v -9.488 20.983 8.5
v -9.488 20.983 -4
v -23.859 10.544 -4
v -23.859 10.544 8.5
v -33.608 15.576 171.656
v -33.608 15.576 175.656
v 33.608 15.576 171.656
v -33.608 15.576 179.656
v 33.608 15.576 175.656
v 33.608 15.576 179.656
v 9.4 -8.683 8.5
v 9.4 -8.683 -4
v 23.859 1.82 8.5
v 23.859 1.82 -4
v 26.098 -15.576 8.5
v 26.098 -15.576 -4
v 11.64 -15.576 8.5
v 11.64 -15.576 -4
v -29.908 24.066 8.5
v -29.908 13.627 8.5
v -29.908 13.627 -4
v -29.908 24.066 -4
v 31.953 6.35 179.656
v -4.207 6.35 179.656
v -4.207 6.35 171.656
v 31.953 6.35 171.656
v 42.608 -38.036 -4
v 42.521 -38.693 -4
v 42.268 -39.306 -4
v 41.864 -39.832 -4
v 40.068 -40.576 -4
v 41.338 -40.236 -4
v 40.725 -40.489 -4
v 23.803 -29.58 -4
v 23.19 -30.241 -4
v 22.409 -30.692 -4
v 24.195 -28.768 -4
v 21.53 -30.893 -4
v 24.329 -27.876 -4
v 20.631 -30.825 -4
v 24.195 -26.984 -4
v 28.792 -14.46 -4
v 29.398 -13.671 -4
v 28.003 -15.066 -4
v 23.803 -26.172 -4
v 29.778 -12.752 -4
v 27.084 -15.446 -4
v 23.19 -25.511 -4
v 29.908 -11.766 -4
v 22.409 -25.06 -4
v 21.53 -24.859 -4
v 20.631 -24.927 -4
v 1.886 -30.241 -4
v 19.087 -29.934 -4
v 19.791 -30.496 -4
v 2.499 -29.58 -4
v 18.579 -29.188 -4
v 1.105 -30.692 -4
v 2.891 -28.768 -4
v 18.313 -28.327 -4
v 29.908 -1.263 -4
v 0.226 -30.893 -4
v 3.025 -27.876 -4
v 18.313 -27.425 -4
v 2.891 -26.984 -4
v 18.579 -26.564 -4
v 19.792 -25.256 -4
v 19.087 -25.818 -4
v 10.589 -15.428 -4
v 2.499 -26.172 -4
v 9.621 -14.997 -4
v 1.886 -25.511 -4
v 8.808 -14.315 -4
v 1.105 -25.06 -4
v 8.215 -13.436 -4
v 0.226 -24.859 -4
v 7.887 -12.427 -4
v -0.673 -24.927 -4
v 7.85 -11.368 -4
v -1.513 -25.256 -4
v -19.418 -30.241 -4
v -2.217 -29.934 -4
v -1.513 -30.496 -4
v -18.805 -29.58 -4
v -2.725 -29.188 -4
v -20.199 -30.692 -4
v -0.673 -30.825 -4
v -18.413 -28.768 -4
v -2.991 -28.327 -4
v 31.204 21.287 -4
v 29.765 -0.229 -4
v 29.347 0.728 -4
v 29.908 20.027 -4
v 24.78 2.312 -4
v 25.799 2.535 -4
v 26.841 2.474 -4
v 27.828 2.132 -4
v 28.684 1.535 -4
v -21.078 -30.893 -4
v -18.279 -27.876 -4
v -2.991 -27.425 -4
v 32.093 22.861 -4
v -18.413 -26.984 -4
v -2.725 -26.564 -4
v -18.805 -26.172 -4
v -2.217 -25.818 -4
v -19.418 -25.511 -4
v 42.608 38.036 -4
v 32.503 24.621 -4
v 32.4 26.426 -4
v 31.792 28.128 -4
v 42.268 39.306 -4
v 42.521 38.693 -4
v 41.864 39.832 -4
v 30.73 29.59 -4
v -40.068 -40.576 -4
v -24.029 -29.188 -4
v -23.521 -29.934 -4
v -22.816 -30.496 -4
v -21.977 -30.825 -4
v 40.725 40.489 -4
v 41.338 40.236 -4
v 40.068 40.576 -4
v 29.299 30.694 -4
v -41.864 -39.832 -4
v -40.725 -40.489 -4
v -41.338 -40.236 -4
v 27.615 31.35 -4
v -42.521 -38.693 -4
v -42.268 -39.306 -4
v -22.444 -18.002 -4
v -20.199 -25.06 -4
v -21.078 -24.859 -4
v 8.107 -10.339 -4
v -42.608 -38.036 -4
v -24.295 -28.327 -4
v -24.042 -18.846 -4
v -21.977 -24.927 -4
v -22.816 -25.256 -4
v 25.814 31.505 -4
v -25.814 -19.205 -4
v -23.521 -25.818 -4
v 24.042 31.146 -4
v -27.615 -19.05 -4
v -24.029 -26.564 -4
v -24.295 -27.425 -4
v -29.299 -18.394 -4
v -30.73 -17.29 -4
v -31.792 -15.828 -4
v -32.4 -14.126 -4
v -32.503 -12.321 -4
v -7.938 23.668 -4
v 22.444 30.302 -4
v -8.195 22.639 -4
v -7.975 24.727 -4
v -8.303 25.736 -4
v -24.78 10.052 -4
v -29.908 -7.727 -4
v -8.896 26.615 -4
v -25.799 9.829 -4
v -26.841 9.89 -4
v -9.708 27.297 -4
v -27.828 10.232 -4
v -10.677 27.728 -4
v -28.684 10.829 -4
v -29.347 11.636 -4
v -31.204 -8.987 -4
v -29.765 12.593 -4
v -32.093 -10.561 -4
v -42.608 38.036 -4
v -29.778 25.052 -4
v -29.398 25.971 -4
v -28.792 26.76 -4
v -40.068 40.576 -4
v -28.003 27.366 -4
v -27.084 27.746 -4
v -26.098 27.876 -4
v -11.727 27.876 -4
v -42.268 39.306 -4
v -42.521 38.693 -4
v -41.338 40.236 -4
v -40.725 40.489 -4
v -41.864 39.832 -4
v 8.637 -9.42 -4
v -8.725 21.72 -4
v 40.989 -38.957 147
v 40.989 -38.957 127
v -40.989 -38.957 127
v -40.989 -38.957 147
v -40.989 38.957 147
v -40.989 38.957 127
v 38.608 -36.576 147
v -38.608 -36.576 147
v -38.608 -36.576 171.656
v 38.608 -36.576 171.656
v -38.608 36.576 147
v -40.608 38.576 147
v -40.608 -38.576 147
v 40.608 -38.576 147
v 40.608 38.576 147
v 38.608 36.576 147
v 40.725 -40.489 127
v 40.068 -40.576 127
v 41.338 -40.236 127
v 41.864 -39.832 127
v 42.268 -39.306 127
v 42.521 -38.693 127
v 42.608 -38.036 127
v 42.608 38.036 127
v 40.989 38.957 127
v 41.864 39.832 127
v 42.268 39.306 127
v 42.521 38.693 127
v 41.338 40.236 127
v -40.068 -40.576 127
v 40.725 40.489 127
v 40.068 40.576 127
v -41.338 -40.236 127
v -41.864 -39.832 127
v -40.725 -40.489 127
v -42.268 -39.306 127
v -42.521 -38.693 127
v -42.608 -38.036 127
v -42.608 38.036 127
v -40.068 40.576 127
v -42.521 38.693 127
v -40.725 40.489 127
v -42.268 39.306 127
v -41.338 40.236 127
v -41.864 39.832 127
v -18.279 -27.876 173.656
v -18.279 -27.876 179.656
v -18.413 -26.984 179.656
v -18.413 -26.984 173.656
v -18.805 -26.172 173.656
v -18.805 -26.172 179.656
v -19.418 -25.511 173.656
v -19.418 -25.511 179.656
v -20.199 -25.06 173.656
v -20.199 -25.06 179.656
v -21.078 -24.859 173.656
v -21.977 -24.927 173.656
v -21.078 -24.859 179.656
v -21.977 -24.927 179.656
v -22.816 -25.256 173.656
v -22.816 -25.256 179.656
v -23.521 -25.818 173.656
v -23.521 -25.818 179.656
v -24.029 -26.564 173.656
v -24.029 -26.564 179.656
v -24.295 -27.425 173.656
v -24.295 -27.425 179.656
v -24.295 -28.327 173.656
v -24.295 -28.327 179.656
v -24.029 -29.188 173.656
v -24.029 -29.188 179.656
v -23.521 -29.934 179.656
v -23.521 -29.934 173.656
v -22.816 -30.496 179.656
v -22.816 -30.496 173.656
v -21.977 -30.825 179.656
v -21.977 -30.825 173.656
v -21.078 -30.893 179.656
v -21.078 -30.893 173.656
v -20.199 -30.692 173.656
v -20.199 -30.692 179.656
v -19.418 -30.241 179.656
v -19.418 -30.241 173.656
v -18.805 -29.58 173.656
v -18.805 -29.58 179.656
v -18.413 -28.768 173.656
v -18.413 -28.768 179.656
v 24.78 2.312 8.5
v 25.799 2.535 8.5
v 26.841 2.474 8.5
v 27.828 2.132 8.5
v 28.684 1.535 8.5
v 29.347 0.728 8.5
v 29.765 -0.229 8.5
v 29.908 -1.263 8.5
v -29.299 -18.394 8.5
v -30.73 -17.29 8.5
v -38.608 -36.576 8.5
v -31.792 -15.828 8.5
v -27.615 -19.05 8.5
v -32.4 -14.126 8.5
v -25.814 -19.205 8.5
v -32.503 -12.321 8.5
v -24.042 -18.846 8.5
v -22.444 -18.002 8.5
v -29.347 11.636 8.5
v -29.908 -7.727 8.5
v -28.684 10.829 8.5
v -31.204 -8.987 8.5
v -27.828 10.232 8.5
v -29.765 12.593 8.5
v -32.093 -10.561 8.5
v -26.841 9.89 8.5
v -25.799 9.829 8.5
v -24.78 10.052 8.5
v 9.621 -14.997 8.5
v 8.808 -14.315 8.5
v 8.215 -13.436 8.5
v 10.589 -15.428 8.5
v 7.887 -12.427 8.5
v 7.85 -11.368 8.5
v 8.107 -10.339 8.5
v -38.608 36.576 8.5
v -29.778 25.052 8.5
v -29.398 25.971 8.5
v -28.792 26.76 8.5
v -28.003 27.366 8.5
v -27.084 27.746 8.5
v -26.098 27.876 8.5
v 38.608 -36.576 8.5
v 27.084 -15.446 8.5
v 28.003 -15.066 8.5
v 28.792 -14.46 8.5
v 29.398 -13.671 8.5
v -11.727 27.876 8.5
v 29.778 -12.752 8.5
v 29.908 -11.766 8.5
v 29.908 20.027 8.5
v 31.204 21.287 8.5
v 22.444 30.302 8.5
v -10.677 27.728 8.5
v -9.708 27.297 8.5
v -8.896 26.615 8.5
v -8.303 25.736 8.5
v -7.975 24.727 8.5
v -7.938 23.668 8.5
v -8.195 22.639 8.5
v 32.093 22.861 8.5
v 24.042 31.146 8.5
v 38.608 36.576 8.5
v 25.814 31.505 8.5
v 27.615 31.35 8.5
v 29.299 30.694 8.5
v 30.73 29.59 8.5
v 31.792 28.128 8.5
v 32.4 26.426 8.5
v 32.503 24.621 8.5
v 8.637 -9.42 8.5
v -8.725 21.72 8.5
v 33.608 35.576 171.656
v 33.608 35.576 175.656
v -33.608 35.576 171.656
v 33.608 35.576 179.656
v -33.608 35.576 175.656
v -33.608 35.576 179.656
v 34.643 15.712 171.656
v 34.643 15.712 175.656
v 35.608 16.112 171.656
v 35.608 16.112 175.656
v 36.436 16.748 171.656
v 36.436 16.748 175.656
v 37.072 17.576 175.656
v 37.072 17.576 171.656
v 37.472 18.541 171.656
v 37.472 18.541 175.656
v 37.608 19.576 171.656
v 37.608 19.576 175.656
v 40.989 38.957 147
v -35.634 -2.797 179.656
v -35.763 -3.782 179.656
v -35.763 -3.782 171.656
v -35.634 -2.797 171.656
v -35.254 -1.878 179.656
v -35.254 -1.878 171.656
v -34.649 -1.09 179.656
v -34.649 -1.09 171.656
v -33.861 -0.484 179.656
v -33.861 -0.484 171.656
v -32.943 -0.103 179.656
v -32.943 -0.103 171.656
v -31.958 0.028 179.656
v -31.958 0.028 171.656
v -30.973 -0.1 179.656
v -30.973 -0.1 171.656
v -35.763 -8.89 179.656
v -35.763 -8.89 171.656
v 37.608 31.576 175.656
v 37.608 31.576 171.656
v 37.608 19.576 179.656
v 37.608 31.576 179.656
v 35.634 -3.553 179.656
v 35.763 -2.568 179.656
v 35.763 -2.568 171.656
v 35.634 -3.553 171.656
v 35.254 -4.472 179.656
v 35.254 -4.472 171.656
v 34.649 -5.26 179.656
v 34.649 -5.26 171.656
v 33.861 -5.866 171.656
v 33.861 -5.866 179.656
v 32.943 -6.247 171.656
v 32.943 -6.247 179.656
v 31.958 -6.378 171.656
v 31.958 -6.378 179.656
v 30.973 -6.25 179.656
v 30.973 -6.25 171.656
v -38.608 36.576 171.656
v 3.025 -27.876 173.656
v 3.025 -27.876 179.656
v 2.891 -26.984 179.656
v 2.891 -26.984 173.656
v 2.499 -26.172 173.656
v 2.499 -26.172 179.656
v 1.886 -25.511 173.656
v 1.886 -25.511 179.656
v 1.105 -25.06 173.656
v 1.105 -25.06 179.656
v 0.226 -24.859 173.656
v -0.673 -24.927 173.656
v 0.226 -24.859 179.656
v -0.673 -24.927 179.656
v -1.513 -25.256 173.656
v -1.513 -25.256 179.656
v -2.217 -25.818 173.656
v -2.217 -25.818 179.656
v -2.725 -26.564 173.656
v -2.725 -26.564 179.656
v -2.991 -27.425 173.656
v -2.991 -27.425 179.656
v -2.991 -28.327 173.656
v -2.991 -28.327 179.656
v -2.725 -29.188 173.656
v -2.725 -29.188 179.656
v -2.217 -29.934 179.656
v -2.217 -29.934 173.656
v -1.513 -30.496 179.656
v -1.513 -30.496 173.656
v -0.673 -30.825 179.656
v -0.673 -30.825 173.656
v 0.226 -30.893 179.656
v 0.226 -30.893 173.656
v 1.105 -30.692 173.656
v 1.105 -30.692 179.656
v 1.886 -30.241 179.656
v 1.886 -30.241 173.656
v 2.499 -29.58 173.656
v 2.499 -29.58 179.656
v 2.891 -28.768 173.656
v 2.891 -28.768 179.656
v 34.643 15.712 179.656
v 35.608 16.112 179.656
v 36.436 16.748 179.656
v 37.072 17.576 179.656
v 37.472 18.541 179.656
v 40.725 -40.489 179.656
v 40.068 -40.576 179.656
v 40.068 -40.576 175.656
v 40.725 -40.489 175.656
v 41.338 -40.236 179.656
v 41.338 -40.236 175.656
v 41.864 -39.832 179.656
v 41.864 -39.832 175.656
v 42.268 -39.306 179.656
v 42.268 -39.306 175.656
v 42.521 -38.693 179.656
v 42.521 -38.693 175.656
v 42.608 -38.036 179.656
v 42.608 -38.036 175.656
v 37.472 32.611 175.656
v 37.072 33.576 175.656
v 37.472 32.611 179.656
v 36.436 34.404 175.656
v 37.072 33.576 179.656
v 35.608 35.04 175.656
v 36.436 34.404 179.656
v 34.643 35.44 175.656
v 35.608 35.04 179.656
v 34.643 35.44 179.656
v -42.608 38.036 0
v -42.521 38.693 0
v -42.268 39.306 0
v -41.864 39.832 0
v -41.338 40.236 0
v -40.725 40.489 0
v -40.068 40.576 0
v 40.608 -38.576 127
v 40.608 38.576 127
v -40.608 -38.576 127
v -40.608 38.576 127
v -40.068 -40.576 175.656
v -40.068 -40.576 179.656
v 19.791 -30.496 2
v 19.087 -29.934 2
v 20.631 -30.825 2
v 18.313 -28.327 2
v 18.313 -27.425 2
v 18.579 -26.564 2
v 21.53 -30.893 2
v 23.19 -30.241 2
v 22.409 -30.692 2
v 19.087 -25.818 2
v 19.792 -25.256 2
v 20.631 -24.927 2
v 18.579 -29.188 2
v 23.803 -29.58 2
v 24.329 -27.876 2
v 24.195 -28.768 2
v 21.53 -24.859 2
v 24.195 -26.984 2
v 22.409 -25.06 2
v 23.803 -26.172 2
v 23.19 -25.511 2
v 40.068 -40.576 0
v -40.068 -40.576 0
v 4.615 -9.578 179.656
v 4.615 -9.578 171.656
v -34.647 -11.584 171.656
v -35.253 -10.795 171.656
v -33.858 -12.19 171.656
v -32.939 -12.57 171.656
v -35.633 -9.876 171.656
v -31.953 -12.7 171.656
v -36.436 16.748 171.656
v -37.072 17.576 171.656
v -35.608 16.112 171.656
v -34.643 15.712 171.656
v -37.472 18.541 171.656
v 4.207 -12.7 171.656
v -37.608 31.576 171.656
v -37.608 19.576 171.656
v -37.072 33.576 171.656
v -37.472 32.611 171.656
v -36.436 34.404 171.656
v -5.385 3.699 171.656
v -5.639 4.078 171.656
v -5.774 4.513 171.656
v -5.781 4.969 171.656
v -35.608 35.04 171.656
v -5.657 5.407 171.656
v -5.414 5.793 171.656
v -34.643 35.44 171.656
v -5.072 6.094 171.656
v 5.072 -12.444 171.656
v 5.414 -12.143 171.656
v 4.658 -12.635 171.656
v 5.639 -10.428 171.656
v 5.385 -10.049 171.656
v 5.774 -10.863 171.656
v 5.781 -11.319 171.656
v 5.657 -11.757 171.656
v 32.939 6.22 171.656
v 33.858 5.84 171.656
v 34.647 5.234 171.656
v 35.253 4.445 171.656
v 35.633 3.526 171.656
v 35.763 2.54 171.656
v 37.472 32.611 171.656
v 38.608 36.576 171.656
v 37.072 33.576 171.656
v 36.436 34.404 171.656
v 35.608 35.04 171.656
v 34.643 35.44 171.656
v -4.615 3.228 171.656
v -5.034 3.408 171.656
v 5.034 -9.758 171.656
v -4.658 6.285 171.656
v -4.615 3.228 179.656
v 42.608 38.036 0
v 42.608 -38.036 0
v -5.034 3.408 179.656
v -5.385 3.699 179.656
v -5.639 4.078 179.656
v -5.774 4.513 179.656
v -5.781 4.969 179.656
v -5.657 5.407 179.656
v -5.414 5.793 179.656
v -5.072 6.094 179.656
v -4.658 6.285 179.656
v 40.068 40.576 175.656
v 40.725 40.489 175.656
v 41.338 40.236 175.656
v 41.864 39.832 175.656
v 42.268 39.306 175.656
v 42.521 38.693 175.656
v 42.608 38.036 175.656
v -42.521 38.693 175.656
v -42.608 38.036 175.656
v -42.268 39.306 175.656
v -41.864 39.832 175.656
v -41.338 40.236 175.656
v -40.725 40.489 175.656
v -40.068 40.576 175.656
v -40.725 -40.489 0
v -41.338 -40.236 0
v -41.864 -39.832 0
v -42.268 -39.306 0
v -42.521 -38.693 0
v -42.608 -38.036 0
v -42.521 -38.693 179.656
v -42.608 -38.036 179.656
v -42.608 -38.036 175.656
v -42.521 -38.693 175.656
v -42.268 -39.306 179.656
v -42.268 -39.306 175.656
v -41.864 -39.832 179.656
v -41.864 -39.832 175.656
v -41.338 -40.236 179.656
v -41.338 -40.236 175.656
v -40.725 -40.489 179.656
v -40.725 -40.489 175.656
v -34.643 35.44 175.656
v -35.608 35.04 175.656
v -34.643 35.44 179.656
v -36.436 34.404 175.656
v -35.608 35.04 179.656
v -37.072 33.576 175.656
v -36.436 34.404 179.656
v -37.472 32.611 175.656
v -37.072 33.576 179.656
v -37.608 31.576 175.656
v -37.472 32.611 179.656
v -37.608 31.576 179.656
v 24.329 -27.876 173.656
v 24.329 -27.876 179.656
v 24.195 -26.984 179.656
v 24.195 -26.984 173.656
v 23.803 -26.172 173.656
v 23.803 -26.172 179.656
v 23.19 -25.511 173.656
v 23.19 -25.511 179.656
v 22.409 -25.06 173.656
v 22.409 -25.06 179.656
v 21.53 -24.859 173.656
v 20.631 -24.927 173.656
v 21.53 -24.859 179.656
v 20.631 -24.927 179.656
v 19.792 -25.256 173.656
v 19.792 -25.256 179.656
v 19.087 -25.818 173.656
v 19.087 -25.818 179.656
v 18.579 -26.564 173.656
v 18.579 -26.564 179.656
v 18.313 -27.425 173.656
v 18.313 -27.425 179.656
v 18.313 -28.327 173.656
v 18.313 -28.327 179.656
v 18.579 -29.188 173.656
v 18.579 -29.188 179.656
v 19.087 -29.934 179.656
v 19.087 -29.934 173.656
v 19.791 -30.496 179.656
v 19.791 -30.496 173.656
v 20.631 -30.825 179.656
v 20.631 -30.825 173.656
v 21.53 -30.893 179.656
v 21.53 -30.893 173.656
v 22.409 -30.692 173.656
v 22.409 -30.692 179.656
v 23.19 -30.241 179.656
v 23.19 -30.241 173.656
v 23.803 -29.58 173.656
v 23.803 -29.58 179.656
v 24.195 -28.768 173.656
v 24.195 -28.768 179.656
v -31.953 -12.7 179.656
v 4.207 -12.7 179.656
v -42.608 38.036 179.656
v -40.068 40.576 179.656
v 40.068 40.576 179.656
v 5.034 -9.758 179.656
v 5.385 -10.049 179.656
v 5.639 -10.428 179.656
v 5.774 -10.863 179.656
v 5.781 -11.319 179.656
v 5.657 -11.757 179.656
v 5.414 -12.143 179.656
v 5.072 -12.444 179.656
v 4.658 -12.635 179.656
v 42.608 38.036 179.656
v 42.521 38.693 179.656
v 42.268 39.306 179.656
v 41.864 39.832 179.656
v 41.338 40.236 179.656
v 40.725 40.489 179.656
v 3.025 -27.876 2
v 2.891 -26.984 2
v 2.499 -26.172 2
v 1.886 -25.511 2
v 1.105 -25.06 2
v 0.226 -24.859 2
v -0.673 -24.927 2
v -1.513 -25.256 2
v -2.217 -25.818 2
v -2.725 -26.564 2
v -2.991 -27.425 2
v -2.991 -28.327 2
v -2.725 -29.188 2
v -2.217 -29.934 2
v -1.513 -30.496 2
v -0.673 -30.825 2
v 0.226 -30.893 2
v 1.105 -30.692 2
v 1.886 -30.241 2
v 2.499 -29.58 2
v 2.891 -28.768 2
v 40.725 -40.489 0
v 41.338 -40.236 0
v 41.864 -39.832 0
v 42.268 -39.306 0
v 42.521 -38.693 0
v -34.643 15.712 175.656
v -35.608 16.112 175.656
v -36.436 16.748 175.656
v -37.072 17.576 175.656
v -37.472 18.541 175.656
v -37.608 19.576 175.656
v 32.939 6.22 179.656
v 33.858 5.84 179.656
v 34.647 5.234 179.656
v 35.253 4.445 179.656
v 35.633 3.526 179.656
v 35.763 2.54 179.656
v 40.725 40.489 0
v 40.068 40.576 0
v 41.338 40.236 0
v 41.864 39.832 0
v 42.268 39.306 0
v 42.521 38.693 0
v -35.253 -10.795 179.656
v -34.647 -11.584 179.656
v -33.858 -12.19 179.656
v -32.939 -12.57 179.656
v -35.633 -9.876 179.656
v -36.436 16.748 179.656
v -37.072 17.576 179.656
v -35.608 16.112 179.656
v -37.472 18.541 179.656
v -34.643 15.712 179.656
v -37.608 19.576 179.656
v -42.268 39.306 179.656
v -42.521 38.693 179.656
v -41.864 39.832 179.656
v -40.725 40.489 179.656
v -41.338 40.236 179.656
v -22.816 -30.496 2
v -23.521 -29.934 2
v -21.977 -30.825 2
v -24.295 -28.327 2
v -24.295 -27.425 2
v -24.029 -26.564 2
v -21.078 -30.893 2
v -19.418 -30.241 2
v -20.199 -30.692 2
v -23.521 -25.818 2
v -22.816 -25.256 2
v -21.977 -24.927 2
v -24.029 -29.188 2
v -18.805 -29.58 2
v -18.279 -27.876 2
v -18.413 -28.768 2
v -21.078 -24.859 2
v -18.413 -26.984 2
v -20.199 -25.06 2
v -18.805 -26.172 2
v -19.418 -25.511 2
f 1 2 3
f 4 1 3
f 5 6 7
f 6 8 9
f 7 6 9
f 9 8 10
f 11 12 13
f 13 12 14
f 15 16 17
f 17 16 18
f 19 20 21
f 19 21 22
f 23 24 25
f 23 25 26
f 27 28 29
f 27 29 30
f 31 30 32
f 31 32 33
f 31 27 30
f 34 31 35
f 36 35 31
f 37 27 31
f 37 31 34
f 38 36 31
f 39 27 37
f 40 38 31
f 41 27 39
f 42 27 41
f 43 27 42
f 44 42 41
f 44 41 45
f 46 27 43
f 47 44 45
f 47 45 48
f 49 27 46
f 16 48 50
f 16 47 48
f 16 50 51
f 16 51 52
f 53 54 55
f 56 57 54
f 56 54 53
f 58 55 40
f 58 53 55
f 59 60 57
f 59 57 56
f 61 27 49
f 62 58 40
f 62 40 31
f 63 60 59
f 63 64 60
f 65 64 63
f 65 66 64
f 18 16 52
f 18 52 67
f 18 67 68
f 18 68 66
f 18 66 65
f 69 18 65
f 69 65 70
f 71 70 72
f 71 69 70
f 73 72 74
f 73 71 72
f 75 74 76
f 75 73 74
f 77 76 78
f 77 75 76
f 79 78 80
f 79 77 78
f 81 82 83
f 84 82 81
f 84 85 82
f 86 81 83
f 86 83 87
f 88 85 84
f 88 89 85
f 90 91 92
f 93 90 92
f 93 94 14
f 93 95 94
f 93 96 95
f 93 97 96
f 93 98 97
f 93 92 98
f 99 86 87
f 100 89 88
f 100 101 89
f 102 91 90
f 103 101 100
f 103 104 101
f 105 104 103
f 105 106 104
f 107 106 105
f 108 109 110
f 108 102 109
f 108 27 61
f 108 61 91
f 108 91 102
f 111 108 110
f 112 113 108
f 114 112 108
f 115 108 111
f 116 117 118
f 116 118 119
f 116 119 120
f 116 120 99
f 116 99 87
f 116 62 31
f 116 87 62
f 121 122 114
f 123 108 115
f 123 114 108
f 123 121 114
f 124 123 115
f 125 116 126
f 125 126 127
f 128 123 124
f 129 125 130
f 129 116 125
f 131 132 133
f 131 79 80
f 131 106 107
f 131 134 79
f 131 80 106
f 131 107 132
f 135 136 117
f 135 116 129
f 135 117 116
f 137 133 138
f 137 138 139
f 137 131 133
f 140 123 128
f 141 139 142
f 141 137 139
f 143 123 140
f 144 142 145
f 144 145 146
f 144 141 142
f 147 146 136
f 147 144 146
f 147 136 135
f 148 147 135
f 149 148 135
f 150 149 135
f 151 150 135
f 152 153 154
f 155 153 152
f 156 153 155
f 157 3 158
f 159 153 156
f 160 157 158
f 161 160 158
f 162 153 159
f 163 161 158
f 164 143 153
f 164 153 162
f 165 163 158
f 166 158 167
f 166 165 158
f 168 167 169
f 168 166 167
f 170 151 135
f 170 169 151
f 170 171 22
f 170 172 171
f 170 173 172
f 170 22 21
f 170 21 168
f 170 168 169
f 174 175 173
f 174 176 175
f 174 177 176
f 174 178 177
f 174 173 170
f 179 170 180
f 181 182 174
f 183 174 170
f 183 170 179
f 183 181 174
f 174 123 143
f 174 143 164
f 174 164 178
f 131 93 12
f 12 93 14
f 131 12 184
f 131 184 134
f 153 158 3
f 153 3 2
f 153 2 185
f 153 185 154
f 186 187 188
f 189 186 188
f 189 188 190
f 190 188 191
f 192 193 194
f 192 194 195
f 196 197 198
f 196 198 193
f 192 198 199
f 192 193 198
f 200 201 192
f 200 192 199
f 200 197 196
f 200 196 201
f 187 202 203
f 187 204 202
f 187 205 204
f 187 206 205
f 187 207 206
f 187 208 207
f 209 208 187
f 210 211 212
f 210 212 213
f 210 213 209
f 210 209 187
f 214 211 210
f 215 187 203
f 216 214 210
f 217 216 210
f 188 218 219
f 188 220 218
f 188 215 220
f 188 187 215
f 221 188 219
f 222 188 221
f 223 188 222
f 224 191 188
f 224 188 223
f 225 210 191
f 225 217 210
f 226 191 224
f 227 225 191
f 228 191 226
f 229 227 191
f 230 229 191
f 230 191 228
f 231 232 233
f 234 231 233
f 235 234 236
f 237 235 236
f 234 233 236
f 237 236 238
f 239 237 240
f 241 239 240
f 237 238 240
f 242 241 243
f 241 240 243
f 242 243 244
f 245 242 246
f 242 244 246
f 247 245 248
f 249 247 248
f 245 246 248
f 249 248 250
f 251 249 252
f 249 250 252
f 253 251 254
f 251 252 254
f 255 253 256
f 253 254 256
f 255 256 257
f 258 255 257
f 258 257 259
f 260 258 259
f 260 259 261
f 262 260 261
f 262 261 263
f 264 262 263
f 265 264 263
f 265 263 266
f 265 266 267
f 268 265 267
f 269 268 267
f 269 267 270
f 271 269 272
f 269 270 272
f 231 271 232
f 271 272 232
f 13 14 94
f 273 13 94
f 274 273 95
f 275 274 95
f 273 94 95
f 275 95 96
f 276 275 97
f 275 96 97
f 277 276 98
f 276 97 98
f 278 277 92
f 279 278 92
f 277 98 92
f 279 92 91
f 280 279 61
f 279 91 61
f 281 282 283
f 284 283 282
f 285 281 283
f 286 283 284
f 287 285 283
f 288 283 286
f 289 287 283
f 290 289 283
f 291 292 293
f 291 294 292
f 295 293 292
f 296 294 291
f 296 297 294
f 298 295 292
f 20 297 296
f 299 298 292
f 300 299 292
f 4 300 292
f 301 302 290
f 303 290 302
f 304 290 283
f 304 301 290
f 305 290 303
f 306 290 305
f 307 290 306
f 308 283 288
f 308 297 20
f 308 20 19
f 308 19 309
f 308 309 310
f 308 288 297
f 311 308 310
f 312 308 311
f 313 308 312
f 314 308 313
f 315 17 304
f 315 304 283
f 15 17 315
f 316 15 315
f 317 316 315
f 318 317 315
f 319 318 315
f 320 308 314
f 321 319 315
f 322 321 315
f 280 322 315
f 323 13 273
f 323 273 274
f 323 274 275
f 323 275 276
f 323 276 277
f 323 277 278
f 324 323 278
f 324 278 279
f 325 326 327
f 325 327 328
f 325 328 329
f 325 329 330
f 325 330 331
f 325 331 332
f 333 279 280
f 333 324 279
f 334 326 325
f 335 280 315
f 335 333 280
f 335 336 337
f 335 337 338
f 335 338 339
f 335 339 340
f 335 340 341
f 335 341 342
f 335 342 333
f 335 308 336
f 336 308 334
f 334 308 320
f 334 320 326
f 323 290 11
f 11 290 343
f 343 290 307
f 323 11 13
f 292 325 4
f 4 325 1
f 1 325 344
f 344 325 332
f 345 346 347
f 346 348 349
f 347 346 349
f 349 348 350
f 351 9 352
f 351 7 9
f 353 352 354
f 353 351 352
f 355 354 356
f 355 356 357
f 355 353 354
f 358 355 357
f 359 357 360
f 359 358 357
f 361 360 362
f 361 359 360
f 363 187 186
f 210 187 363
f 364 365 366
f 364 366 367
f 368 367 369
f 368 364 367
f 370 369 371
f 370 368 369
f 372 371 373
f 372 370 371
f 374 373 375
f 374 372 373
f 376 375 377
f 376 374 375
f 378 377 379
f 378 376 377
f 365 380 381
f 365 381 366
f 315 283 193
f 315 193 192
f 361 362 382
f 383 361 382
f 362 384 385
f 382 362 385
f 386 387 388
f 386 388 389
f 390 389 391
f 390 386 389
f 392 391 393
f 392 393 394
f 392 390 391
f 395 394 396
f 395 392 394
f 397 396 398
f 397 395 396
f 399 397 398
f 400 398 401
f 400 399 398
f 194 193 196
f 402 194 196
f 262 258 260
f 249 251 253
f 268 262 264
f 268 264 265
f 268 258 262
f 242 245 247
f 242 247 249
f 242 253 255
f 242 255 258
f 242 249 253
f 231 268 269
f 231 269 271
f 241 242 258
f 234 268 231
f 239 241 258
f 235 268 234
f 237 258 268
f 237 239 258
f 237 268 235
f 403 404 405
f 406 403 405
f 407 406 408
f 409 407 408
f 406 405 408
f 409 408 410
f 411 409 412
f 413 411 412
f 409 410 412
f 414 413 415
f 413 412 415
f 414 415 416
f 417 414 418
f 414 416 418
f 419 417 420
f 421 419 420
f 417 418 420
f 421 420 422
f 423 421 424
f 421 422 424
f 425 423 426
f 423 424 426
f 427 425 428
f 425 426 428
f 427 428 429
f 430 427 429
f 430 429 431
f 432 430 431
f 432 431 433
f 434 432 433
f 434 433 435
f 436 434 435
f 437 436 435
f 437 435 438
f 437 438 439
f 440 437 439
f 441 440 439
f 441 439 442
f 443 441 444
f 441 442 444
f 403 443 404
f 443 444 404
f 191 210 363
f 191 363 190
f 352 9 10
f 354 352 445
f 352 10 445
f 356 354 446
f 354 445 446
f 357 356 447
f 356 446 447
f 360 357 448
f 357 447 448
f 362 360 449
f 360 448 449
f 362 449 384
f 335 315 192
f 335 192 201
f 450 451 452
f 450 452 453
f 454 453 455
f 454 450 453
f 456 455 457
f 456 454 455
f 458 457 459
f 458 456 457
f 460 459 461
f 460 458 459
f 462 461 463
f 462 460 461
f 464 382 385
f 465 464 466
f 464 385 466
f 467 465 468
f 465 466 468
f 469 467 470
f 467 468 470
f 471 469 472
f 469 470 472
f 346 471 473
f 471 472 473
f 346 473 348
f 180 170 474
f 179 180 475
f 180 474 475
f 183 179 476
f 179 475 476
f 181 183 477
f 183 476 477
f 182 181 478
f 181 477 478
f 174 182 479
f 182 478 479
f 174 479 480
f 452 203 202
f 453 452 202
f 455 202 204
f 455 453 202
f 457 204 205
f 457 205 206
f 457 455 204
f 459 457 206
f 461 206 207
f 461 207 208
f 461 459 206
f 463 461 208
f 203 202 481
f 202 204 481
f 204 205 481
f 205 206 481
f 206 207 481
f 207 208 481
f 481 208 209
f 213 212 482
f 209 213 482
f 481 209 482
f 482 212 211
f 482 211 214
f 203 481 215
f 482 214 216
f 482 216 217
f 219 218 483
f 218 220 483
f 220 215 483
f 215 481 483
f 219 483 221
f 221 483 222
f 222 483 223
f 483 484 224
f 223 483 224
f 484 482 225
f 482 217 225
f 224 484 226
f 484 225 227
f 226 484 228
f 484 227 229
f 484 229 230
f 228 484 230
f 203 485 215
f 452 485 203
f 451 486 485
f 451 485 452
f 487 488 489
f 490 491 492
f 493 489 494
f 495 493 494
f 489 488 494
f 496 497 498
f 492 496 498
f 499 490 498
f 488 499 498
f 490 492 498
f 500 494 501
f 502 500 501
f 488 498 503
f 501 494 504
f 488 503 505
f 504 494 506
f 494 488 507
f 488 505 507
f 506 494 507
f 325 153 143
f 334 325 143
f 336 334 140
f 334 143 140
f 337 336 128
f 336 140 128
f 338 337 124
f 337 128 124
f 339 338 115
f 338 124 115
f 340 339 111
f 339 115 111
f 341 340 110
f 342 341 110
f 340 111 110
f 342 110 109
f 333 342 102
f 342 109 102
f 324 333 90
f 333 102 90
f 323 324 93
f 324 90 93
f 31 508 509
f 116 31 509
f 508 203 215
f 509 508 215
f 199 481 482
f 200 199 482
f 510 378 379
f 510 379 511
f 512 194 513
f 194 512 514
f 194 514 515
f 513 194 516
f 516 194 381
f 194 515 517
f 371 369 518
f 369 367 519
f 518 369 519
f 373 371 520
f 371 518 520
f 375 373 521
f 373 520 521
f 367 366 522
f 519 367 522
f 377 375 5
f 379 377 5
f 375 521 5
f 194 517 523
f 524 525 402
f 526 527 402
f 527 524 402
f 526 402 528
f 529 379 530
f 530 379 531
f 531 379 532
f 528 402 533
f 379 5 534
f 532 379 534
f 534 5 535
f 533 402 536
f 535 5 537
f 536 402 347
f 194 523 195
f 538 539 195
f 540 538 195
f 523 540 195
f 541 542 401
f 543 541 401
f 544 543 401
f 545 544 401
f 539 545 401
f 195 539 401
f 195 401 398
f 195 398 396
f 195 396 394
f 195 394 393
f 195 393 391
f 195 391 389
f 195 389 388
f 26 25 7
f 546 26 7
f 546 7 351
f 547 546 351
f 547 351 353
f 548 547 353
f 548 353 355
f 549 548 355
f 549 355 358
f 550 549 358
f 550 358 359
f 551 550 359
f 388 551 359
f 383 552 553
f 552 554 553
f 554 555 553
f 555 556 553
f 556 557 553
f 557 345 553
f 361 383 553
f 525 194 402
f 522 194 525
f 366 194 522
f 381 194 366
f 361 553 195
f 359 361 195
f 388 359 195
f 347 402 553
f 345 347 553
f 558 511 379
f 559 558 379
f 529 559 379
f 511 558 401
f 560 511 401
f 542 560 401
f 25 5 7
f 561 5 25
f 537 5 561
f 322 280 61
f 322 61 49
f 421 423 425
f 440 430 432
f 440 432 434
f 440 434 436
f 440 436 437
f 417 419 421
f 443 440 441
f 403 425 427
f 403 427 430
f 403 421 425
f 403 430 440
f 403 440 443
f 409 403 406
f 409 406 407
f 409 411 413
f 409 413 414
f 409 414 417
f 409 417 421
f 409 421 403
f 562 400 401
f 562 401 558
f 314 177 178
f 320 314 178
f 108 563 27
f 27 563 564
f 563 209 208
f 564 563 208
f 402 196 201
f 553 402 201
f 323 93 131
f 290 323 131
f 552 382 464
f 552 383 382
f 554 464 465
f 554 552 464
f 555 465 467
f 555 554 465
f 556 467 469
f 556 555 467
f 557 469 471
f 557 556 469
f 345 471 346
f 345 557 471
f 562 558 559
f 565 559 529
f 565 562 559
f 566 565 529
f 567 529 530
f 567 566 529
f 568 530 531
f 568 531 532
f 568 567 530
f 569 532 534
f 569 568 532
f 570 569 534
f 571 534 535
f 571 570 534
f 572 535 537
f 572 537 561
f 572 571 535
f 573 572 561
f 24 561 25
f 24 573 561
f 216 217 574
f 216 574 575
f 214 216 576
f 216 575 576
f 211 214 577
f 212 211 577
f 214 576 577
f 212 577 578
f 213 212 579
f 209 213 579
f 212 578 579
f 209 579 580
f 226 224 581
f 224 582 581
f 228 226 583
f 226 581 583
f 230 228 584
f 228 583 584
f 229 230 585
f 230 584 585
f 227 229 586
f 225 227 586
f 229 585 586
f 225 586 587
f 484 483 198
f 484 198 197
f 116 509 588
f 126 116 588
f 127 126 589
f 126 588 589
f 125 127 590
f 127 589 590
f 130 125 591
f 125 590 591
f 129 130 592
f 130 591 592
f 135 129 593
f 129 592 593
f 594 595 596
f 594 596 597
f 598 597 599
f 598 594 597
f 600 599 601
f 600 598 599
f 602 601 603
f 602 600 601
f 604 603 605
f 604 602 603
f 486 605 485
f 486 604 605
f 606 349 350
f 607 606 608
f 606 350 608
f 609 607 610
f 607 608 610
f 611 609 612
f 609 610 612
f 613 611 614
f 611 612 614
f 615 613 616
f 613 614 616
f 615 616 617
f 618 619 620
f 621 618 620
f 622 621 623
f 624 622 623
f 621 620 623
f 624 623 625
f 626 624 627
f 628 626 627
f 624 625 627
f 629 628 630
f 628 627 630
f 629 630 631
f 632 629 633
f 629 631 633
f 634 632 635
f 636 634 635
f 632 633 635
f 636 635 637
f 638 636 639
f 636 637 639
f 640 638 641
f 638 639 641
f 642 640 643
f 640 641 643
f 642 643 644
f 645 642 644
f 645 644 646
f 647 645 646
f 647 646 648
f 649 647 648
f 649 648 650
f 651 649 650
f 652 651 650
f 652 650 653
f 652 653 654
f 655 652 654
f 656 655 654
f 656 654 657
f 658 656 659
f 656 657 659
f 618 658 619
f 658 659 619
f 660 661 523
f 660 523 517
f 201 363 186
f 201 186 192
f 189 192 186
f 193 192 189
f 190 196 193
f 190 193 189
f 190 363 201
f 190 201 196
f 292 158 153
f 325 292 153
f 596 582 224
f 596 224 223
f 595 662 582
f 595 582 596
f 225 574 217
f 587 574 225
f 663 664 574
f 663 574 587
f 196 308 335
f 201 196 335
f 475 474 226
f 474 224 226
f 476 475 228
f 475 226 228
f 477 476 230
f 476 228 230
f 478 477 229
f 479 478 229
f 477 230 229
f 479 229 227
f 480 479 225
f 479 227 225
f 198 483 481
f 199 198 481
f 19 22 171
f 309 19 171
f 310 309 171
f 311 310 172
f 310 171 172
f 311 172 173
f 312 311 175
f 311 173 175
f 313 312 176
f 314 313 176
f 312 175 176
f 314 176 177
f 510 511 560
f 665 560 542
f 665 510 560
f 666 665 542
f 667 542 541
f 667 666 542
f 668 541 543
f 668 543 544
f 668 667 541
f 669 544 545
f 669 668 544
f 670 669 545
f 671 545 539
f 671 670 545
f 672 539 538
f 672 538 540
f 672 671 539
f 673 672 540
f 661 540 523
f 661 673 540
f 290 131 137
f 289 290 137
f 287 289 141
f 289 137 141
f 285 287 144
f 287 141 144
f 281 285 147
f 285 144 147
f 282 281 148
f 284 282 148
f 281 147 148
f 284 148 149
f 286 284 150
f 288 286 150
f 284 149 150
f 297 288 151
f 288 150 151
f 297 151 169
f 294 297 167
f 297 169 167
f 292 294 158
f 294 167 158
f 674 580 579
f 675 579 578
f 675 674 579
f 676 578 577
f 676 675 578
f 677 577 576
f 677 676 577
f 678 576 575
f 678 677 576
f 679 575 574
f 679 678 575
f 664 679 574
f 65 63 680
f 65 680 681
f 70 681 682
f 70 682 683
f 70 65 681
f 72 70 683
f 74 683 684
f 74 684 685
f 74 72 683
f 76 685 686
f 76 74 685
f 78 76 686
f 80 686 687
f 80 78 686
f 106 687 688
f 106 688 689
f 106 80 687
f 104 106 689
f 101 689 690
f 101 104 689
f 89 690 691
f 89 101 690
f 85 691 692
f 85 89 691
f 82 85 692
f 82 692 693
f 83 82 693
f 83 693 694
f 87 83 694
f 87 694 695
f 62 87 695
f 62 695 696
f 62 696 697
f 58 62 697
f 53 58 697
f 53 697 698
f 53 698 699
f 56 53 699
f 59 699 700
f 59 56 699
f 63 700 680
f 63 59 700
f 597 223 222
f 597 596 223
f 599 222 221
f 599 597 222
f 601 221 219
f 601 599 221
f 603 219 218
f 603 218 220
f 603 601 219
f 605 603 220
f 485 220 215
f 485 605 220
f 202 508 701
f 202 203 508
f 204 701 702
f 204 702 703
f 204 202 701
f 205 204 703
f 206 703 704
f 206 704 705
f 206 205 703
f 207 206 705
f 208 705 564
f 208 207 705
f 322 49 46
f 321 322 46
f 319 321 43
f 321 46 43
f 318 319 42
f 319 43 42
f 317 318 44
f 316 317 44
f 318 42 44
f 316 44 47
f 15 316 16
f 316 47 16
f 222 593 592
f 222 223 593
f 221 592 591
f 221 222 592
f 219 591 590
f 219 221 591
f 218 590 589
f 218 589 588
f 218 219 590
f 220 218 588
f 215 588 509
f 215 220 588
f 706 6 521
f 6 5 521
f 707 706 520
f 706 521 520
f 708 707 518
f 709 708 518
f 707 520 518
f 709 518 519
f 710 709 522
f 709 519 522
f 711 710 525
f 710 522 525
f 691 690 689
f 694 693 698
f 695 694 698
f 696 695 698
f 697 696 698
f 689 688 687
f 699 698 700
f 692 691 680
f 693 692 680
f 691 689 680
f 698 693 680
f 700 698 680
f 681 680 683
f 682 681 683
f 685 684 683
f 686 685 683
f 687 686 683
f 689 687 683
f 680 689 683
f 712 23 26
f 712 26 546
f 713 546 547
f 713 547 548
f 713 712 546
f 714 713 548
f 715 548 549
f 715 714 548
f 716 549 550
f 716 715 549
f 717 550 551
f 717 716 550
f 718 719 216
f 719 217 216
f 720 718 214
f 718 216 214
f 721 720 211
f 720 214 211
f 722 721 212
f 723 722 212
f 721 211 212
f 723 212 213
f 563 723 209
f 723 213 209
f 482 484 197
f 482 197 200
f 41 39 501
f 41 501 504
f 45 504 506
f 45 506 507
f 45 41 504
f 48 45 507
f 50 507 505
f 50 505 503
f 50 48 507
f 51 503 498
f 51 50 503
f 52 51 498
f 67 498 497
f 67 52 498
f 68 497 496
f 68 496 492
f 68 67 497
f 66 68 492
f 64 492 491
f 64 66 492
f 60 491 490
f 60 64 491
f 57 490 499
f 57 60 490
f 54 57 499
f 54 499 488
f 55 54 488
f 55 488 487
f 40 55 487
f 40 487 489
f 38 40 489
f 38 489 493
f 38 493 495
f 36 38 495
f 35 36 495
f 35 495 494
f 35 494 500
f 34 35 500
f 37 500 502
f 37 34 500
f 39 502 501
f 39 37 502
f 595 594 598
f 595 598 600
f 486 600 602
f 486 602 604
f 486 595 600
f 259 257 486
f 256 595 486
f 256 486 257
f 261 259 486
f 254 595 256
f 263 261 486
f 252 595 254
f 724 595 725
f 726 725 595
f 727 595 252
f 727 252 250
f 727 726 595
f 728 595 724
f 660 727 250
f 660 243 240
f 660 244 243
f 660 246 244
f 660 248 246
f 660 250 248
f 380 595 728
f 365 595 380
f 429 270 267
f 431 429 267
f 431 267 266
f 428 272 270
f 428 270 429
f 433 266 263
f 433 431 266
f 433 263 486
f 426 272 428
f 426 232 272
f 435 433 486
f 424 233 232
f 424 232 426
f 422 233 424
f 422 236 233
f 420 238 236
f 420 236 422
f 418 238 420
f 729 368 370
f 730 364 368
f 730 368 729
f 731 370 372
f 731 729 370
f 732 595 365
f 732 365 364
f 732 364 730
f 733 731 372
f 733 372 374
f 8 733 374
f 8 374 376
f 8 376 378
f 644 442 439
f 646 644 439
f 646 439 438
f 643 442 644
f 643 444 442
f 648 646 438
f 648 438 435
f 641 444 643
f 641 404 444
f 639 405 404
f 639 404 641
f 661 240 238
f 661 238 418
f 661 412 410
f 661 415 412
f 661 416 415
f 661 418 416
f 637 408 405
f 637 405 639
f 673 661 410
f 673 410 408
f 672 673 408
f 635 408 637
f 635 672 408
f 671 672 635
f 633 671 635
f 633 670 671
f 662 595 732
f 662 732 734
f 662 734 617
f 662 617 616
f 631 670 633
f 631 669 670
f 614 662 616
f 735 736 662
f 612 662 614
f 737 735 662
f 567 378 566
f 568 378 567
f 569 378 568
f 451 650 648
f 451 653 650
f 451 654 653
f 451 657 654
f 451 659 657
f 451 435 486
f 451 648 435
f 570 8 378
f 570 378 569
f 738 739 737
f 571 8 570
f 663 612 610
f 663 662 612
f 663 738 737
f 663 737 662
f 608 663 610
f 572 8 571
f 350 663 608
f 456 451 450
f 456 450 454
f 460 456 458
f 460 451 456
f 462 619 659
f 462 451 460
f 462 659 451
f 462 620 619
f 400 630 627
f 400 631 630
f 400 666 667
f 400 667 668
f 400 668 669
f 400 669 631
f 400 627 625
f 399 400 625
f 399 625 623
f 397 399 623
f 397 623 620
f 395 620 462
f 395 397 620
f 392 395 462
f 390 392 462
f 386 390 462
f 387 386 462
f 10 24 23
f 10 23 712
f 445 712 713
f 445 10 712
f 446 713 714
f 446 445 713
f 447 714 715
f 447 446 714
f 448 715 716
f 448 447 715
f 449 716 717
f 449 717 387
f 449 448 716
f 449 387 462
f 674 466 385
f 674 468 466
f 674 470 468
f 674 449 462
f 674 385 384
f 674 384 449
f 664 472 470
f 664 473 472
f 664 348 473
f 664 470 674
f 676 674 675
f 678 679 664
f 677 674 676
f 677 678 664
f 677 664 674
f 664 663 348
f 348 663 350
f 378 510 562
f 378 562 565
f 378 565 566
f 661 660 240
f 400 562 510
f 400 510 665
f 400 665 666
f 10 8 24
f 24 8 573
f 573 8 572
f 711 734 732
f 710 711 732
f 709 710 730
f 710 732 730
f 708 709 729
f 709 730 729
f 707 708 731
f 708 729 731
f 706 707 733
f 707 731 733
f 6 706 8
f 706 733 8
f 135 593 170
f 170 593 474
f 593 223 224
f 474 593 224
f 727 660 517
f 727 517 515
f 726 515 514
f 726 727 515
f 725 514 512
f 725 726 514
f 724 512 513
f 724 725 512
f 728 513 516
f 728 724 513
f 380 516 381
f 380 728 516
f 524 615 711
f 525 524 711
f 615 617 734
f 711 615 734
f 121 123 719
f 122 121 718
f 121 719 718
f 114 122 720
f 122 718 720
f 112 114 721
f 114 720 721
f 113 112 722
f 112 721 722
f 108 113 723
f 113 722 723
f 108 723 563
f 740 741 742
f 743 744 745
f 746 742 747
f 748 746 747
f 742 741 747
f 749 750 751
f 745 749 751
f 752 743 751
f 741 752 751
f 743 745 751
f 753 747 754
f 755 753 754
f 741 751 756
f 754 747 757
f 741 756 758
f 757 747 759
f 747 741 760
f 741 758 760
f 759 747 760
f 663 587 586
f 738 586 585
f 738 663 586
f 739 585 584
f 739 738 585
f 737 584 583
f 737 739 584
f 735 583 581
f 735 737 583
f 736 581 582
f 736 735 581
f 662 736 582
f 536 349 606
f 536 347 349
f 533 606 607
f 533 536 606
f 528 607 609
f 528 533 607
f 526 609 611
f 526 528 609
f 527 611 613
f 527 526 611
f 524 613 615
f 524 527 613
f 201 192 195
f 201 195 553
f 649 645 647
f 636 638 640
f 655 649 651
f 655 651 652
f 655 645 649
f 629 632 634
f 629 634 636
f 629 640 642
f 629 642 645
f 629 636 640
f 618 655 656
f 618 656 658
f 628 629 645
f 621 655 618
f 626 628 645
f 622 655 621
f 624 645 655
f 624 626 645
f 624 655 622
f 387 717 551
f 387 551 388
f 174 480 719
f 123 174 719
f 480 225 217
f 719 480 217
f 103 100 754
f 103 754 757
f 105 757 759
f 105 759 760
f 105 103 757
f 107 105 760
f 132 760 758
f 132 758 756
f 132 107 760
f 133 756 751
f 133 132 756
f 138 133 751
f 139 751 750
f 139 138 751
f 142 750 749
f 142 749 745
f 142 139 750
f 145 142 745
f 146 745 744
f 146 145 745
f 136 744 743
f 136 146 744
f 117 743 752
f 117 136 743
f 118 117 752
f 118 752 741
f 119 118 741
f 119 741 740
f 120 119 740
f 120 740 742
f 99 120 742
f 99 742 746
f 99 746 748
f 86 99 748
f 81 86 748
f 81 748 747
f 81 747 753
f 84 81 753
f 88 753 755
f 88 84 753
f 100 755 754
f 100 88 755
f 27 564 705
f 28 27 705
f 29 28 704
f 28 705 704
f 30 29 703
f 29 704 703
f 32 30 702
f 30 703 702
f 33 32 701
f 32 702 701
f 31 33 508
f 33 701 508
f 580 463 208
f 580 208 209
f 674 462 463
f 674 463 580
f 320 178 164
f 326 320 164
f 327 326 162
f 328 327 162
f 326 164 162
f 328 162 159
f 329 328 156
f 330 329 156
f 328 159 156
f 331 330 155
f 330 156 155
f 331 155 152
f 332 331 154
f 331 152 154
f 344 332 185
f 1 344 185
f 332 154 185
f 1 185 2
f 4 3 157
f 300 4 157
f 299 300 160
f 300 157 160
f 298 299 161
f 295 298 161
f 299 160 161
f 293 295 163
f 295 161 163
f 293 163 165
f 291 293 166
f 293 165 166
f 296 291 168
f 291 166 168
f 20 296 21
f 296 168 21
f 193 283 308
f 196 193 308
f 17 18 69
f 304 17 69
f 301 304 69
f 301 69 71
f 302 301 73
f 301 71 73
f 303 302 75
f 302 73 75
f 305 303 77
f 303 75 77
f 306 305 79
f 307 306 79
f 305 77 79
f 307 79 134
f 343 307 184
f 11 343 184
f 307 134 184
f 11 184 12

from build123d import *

# Parameters (mm, degrees)
SKETCH1_W           = 85.216
SKETCH1_H           = 81.152
BOSS_EXTRUDE1_DEPTH = 175.656
SHELL2_T            = -4
SHELL3_T            = -4
FILLET1_R           = 2.54
FILLET2_R           = 2.54
SKETCH4_W           = 81.216
SKETCH4_H           = 77.152
SKETCH4_W_2         = 77.216
SKETCH4_H_2         = 73.152
BOSS_EXTRUDE2_DEPTH = 20
SKETCH5_W           = 81.978
SKETCH5_H           = 77.914
SKETCH5_W_2         = 77.216
SKETCH5_H_2         = 73.152
CUT_EXTRUDE2_DEPTH  = 20
SKETCH6_W           = 75.216
SKETCH6_H           = 20
CUT_EXTRUDE3_DEPTH  = 4
FILLET3_R           = 4
BOSS_EXTRUDE3_START = 4
BOSS_EXTRUDE3_DEPTH = 4
BOSS_EXTRUDE4_DEPTH = 4
SKETCH9_R           = 3.025
CUT_EXTRUDE4_DEPTH  = 6
SKETCH10_W          = 77.216
SKETCH10_H          = 73.152
BOSS_EXTRUDE5_DEPTH = 4.500000096
CUT_EXTRUDE5_DEPTH  = 12.500000096
CUT_EXTRUDE6_DEPTH  = 8


with BuildPart() as part:
    # Sketch1 → Boss-Extrude1 (new body)
    with BuildSketch(Plane.XY):
        Rectangle(SKETCH1_W, SKETCH1_H)
    extrude(amount=BOSS_EXTRUDE1_DEPTH)


with BuildPart() as body_2:
    # Split1: the piece on the far side of the plane
    add(part.part)
    split(bisect_by=Plane(origin=(0, 0, 127), x_dir=(-1, 0, 0), z_dir=(0, 0, -1)), keep=Keep.BOTTOM)

    # Shell3
    shell3_openings = [body_2.faces().sort_by_distance(p)[0] for p in [
        (0, 0, 127),
    ]]
    offset(amount=SHELL3_T, openings=shell3_openings, kind=Kind.INTERSECTION)

    # Fillet2
    fillet2_edges = [body_2.edges().sort_by_distance(p)[0] for p in [
        (-42.608, 40.576, 151.328),
        (42.608, 40.576, 151.328),
        (42.608, -40.576, 151.328),
        (-42.608, -40.576, 151.328),
    ]]
    fillet(fillet2_edges, radius=FILLET2_R)

    # Sketch5 → Cut-Extrude2 (cut)
    with BuildSketch(Plane(origin=(0, 0, 127), x_dir=(-1, 0, 0), z_dir=(0, 0, -1))):
        Rectangle(SKETCH5_W, SKETCH5_H)
        Rectangle(SKETCH5_W_2, SKETCH5_H_2, mode=Mode.SUBTRACT)
    extrude(amount=-CUT_EXTRUDE2_DEPTH, mode=Mode.SUBTRACT)

    # Sketch6 → Cut-Extrude3 (cut)
    with BuildSketch(Plane.XY.offset(175.656)):
        with Locations((0, 25.576)):
            Rectangle(SKETCH6_W, SKETCH6_H)
    extrude(amount=-CUT_EXTRUDE3_DEPTH, mode=Mode.SUBTRACT)

    # Fillet3
    fillet3_edges = [body_2.edges().sort_by_distance(p)[0] for p in [
        (37.608, 35.576, 173.656),
        (37.608, 15.576, 173.656),
        (-37.608, 15.576, 173.656),
        (-37.608, 35.576, 173.656),
    ]]
    fillet(fillet3_edges, radius=FILLET3_R)

    # Sketch7 → Boss-Extrude3 (add)
    with BuildSketch(Plane.XY.offset(175.656).offset(BOSS_EXTRUDE3_START)):
        with BuildLine():
            Line((-42.608, 38.036), (-42.608, -38.036))
            ThreePointArc((-42.608, -38.036), (-41.864051224, -39.832051224), (-40.068, -40.576))
            Line((-40.068, -40.576), (40.068, -40.576))
            ThreePointArc((40.068, -40.576), (41.864051224, -39.832051224), (42.608, -38.036))
            Line((42.608, -38.036), (42.608, 38.036))
            ThreePointArc((42.608, 38.036), (41.864051224, 39.832051224), (40.068, 40.576))
            Line((40.068, 40.576), (-40.068, 40.576))
            ThreePointArc((-40.068, 40.576), (-41.864051224, 39.832051224), (-42.608, 38.036))
        make_face()
        with BuildLine():
            Line((-33.608, 15.576), (33.608, 15.576))
            ThreePointArc((33.608, 15.576), (36.436427125, 16.747572875), (37.608, 19.576))
            Line((37.608, 19.576), (37.608, 31.576))
            ThreePointArc((37.608, 31.576), (36.436427125, 34.404427125), (33.608, 35.576))
            Line((33.608, 35.576), (-33.608, 35.576))
            ThreePointArc((-33.608, 35.576), (-36.436427125, 34.404427125), (-37.608, 31.576))
            Line((-37.608, 31.576), (-37.608, 19.576))
            ThreePointArc((-37.608, 19.576), (-36.436427125, 16.747572875), (-33.608, 15.576))
        make_face(mode=Mode.SUBTRACT)
    extrude(amount=-BOSS_EXTRUDE3_DEPTH)

    # Sketch9 → Cut-Extrude4 (cut)
    with BuildSketch(Plane.XY.offset(179.656)):
        with Locations((-21.304, -27.876)):
            Circle(SKETCH9_R)
        with Locations((0, -27.876)):
            Circle(SKETCH9_R)
        with Locations((21.304, -27.876)):
            Circle(SKETCH9_R)
    cut_extrude4 = extrude(amount=-CUT_EXTRUDE4_DEPTH, mode=Mode.SUBTRACT)

    # Sketch12 → Cut-Extrude6 (cut)
    with BuildSketch(Plane.XY.offset(179.656)):
        with BuildLine():
            Line((-30.972571902, -0.100195505), (4.615140384, -9.578475727))
            ThreePointArc((4.615140384, -9.578475727), (5.780649168, -11.318525139), (4.206574871, -12.7))
            Line((4.206574871, -12.7), (-31.953129133, -12.7))
            ThreePointArc((-31.953129133, -12.7), (-34.64720597, -11.584076836), (-35.763129133, -8.89))
            Line((-35.763129133, -8.89), (-35.763129133, -3.781853761))
            ThreePointArc((-35.763129133, -3.781853761), (-34.274785541, -0.760924844), (-30.972571902, -0.100195505))
        make_face()
        with BuildLine():
            Line((-4.206574871, 6.35), (31.953129133, 6.35))
            ThreePointArc((31.953129133, 6.35), (34.64720597, 5.234076836), (35.763129133, 2.54))
            Line((35.763129133, 2.54), (35.763129133, -2.568146239))
            ThreePointArc((35.763129133, -2.568146239), (34.274785541, -5.589075156), (30.972571902, -6.249804495))
            Line((30.972571902, -6.249804495), (-4.615140384, 3.228475727))
            ThreePointArc((-4.615140384, 3.228475727), (-5.780649168, 4.968525139), (-4.206574871, 6.35))
        make_face()
    extrude(amount=-CUT_EXTRUDE6_DEPTH, mode=Mode.SUBTRACT)


with BuildPart() as part_1:
    add(part.part)

    # Split1
    split(bisect_by=Plane(origin=(0, 0, 127), x_dir=(-1, 0, 0), z_dir=(0, 0, -1)), keep=Keep.TOP)

    # Shell2
    shell2_openings = [part_1.faces().sort_by_distance(p)[0] for p in [
        (0, 0, 127),
    ]]
    offset(amount=SHELL2_T, openings=shell2_openings, kind=Kind.INTERSECTION)

    # Fillet1
    fillet1_edges = [part_1.edges().sort_by_distance(p)[0] for p in [
        (-42.608, 40.576, 63.5),
        (42.608, 40.576, 63.5),
        (42.608, -40.576, 63.5),
        (-42.608, -40.576, 63.5),
    ]]
    fillet(fillet1_edges, radius=FILLET1_R)

    # Sketch4 → Boss-Extrude2 (add)
    with BuildSketch(Plane.XY.offset(127)):
        Rectangle(SKETCH4_W, SKETCH4_H)
        Rectangle(SKETCH4_W_2, SKETCH4_H_2, mode=Mode.SUBTRACT)
    extrude(amount=BOSS_EXTRUDE2_DEPTH)

    # Sketch8 → Boss-Extrude4 (add)
    with BuildSketch(Plane(origin=(0, 0, 0), x_dir=(-1, 0, 0), z_dir=(0, 0, -1))):
        with BuildLine():
            Line((40.068, 40.576), (-40.068, 40.576))
            ThreePointArc((-40.068, 40.576), (-41.864051224, 39.832051224), (-42.608, 38.036))
            Line((-42.608, 38.036), (-42.608, -38.036))
            ThreePointArc((-42.608, -38.036), (-41.864051224, -39.832051224), (-40.068, -40.576))
            Line((-40.068, -40.576), (40.068, -40.576))
            ThreePointArc((40.068, -40.576), (41.864051224, -39.832051224), (42.608, -38.036))
            Line((42.608, -38.036), (42.608, 38.036))
            ThreePointArc((42.608, 38.036), (41.864051224, 39.832051224), (40.068, 40.576))
        make_face()
    extrude(amount=BOSS_EXTRUDE4_DEPTH)

    # Mirror1: Cut-Extrude4 across plane
    add(cut_extrude4.mirror(Plane.XY.offset(87.828)), mode=Mode.SUBTRACT)

    # Sketch10 → Boss-Extrude5 (add)
    with BuildSketch(Plane.XY.offset(4)):
        Rectangle(SKETCH10_W, SKETCH10_H)
    extrude(amount=BOSS_EXTRUDE5_DEPTH)

    # Sketch11 → Cut-Extrude5 (cut)
    with BuildSketch(Plane(origin=(0, 0, -4), x_dir=(-1, 0, 0), z_dir=(0, 0, -1))):
        with BuildLine():
            ThreePointArc((29.908, 24.066), (28.792076836, 26.760076836), (26.098, 27.876))
            Line((26.098, 27.876), (11.727473696, 27.876))
            ThreePointArc((11.727473696, 27.876), (8.103904131, 25.243218589), (9.488243538, 20.983476959))
            Line((9.488243538, 20.983476959), (23.858769841, 10.544328421))
            ThreePointArc((23.858769841, 10.544328421), (27.827831364, 10.232181603), (29.908, 13.626851462))
            Line((29.908, 13.626851462), (29.908, 24.066))
        make_face()
        with BuildLine():
            ThreePointArc((-23.858769841, 1.819526927), (-27.827831364, 2.131673746), (-29.908, -1.262996113))
            Line((-29.908, -1.262996113), (-29.908, -11.766))
            ThreePointArc((-29.908, -11.766), (-28.792076836, -14.460076836), (-26.098, -15.576))
            Line((-26.098, -15.576), (-11.639570458, -15.576))
            ThreePointArc((-11.639570458, -15.576), (-8.016000893, -12.943218589), (-9.400340299, -8.683476959))
            Line((-9.400340299, -8.683476959), (-23.858769841, 1.819526927))
        make_face()
        with BuildLine():
            ThreePointArc((22.443899471, -18.002473668), (31.313488137, -16.596985531), (29.908, -7.727396865))
            Line((29.908, -7.727396865), (-22.443899471, 30.302473668))
            ThreePointArc((-22.443899471, 30.302473668), (-31.313488137, 28.896985531), (-29.908, 20.027396865))
            Line((-29.908, 20.027396865), (22.443899471, -18.002473668))
        make_face()
    extrude(amount=-CUT_EXTRUDE5_DEPTH, mode=Mode.SUBTRACT)


solid = Compound([body_2.part, part_1.part])
